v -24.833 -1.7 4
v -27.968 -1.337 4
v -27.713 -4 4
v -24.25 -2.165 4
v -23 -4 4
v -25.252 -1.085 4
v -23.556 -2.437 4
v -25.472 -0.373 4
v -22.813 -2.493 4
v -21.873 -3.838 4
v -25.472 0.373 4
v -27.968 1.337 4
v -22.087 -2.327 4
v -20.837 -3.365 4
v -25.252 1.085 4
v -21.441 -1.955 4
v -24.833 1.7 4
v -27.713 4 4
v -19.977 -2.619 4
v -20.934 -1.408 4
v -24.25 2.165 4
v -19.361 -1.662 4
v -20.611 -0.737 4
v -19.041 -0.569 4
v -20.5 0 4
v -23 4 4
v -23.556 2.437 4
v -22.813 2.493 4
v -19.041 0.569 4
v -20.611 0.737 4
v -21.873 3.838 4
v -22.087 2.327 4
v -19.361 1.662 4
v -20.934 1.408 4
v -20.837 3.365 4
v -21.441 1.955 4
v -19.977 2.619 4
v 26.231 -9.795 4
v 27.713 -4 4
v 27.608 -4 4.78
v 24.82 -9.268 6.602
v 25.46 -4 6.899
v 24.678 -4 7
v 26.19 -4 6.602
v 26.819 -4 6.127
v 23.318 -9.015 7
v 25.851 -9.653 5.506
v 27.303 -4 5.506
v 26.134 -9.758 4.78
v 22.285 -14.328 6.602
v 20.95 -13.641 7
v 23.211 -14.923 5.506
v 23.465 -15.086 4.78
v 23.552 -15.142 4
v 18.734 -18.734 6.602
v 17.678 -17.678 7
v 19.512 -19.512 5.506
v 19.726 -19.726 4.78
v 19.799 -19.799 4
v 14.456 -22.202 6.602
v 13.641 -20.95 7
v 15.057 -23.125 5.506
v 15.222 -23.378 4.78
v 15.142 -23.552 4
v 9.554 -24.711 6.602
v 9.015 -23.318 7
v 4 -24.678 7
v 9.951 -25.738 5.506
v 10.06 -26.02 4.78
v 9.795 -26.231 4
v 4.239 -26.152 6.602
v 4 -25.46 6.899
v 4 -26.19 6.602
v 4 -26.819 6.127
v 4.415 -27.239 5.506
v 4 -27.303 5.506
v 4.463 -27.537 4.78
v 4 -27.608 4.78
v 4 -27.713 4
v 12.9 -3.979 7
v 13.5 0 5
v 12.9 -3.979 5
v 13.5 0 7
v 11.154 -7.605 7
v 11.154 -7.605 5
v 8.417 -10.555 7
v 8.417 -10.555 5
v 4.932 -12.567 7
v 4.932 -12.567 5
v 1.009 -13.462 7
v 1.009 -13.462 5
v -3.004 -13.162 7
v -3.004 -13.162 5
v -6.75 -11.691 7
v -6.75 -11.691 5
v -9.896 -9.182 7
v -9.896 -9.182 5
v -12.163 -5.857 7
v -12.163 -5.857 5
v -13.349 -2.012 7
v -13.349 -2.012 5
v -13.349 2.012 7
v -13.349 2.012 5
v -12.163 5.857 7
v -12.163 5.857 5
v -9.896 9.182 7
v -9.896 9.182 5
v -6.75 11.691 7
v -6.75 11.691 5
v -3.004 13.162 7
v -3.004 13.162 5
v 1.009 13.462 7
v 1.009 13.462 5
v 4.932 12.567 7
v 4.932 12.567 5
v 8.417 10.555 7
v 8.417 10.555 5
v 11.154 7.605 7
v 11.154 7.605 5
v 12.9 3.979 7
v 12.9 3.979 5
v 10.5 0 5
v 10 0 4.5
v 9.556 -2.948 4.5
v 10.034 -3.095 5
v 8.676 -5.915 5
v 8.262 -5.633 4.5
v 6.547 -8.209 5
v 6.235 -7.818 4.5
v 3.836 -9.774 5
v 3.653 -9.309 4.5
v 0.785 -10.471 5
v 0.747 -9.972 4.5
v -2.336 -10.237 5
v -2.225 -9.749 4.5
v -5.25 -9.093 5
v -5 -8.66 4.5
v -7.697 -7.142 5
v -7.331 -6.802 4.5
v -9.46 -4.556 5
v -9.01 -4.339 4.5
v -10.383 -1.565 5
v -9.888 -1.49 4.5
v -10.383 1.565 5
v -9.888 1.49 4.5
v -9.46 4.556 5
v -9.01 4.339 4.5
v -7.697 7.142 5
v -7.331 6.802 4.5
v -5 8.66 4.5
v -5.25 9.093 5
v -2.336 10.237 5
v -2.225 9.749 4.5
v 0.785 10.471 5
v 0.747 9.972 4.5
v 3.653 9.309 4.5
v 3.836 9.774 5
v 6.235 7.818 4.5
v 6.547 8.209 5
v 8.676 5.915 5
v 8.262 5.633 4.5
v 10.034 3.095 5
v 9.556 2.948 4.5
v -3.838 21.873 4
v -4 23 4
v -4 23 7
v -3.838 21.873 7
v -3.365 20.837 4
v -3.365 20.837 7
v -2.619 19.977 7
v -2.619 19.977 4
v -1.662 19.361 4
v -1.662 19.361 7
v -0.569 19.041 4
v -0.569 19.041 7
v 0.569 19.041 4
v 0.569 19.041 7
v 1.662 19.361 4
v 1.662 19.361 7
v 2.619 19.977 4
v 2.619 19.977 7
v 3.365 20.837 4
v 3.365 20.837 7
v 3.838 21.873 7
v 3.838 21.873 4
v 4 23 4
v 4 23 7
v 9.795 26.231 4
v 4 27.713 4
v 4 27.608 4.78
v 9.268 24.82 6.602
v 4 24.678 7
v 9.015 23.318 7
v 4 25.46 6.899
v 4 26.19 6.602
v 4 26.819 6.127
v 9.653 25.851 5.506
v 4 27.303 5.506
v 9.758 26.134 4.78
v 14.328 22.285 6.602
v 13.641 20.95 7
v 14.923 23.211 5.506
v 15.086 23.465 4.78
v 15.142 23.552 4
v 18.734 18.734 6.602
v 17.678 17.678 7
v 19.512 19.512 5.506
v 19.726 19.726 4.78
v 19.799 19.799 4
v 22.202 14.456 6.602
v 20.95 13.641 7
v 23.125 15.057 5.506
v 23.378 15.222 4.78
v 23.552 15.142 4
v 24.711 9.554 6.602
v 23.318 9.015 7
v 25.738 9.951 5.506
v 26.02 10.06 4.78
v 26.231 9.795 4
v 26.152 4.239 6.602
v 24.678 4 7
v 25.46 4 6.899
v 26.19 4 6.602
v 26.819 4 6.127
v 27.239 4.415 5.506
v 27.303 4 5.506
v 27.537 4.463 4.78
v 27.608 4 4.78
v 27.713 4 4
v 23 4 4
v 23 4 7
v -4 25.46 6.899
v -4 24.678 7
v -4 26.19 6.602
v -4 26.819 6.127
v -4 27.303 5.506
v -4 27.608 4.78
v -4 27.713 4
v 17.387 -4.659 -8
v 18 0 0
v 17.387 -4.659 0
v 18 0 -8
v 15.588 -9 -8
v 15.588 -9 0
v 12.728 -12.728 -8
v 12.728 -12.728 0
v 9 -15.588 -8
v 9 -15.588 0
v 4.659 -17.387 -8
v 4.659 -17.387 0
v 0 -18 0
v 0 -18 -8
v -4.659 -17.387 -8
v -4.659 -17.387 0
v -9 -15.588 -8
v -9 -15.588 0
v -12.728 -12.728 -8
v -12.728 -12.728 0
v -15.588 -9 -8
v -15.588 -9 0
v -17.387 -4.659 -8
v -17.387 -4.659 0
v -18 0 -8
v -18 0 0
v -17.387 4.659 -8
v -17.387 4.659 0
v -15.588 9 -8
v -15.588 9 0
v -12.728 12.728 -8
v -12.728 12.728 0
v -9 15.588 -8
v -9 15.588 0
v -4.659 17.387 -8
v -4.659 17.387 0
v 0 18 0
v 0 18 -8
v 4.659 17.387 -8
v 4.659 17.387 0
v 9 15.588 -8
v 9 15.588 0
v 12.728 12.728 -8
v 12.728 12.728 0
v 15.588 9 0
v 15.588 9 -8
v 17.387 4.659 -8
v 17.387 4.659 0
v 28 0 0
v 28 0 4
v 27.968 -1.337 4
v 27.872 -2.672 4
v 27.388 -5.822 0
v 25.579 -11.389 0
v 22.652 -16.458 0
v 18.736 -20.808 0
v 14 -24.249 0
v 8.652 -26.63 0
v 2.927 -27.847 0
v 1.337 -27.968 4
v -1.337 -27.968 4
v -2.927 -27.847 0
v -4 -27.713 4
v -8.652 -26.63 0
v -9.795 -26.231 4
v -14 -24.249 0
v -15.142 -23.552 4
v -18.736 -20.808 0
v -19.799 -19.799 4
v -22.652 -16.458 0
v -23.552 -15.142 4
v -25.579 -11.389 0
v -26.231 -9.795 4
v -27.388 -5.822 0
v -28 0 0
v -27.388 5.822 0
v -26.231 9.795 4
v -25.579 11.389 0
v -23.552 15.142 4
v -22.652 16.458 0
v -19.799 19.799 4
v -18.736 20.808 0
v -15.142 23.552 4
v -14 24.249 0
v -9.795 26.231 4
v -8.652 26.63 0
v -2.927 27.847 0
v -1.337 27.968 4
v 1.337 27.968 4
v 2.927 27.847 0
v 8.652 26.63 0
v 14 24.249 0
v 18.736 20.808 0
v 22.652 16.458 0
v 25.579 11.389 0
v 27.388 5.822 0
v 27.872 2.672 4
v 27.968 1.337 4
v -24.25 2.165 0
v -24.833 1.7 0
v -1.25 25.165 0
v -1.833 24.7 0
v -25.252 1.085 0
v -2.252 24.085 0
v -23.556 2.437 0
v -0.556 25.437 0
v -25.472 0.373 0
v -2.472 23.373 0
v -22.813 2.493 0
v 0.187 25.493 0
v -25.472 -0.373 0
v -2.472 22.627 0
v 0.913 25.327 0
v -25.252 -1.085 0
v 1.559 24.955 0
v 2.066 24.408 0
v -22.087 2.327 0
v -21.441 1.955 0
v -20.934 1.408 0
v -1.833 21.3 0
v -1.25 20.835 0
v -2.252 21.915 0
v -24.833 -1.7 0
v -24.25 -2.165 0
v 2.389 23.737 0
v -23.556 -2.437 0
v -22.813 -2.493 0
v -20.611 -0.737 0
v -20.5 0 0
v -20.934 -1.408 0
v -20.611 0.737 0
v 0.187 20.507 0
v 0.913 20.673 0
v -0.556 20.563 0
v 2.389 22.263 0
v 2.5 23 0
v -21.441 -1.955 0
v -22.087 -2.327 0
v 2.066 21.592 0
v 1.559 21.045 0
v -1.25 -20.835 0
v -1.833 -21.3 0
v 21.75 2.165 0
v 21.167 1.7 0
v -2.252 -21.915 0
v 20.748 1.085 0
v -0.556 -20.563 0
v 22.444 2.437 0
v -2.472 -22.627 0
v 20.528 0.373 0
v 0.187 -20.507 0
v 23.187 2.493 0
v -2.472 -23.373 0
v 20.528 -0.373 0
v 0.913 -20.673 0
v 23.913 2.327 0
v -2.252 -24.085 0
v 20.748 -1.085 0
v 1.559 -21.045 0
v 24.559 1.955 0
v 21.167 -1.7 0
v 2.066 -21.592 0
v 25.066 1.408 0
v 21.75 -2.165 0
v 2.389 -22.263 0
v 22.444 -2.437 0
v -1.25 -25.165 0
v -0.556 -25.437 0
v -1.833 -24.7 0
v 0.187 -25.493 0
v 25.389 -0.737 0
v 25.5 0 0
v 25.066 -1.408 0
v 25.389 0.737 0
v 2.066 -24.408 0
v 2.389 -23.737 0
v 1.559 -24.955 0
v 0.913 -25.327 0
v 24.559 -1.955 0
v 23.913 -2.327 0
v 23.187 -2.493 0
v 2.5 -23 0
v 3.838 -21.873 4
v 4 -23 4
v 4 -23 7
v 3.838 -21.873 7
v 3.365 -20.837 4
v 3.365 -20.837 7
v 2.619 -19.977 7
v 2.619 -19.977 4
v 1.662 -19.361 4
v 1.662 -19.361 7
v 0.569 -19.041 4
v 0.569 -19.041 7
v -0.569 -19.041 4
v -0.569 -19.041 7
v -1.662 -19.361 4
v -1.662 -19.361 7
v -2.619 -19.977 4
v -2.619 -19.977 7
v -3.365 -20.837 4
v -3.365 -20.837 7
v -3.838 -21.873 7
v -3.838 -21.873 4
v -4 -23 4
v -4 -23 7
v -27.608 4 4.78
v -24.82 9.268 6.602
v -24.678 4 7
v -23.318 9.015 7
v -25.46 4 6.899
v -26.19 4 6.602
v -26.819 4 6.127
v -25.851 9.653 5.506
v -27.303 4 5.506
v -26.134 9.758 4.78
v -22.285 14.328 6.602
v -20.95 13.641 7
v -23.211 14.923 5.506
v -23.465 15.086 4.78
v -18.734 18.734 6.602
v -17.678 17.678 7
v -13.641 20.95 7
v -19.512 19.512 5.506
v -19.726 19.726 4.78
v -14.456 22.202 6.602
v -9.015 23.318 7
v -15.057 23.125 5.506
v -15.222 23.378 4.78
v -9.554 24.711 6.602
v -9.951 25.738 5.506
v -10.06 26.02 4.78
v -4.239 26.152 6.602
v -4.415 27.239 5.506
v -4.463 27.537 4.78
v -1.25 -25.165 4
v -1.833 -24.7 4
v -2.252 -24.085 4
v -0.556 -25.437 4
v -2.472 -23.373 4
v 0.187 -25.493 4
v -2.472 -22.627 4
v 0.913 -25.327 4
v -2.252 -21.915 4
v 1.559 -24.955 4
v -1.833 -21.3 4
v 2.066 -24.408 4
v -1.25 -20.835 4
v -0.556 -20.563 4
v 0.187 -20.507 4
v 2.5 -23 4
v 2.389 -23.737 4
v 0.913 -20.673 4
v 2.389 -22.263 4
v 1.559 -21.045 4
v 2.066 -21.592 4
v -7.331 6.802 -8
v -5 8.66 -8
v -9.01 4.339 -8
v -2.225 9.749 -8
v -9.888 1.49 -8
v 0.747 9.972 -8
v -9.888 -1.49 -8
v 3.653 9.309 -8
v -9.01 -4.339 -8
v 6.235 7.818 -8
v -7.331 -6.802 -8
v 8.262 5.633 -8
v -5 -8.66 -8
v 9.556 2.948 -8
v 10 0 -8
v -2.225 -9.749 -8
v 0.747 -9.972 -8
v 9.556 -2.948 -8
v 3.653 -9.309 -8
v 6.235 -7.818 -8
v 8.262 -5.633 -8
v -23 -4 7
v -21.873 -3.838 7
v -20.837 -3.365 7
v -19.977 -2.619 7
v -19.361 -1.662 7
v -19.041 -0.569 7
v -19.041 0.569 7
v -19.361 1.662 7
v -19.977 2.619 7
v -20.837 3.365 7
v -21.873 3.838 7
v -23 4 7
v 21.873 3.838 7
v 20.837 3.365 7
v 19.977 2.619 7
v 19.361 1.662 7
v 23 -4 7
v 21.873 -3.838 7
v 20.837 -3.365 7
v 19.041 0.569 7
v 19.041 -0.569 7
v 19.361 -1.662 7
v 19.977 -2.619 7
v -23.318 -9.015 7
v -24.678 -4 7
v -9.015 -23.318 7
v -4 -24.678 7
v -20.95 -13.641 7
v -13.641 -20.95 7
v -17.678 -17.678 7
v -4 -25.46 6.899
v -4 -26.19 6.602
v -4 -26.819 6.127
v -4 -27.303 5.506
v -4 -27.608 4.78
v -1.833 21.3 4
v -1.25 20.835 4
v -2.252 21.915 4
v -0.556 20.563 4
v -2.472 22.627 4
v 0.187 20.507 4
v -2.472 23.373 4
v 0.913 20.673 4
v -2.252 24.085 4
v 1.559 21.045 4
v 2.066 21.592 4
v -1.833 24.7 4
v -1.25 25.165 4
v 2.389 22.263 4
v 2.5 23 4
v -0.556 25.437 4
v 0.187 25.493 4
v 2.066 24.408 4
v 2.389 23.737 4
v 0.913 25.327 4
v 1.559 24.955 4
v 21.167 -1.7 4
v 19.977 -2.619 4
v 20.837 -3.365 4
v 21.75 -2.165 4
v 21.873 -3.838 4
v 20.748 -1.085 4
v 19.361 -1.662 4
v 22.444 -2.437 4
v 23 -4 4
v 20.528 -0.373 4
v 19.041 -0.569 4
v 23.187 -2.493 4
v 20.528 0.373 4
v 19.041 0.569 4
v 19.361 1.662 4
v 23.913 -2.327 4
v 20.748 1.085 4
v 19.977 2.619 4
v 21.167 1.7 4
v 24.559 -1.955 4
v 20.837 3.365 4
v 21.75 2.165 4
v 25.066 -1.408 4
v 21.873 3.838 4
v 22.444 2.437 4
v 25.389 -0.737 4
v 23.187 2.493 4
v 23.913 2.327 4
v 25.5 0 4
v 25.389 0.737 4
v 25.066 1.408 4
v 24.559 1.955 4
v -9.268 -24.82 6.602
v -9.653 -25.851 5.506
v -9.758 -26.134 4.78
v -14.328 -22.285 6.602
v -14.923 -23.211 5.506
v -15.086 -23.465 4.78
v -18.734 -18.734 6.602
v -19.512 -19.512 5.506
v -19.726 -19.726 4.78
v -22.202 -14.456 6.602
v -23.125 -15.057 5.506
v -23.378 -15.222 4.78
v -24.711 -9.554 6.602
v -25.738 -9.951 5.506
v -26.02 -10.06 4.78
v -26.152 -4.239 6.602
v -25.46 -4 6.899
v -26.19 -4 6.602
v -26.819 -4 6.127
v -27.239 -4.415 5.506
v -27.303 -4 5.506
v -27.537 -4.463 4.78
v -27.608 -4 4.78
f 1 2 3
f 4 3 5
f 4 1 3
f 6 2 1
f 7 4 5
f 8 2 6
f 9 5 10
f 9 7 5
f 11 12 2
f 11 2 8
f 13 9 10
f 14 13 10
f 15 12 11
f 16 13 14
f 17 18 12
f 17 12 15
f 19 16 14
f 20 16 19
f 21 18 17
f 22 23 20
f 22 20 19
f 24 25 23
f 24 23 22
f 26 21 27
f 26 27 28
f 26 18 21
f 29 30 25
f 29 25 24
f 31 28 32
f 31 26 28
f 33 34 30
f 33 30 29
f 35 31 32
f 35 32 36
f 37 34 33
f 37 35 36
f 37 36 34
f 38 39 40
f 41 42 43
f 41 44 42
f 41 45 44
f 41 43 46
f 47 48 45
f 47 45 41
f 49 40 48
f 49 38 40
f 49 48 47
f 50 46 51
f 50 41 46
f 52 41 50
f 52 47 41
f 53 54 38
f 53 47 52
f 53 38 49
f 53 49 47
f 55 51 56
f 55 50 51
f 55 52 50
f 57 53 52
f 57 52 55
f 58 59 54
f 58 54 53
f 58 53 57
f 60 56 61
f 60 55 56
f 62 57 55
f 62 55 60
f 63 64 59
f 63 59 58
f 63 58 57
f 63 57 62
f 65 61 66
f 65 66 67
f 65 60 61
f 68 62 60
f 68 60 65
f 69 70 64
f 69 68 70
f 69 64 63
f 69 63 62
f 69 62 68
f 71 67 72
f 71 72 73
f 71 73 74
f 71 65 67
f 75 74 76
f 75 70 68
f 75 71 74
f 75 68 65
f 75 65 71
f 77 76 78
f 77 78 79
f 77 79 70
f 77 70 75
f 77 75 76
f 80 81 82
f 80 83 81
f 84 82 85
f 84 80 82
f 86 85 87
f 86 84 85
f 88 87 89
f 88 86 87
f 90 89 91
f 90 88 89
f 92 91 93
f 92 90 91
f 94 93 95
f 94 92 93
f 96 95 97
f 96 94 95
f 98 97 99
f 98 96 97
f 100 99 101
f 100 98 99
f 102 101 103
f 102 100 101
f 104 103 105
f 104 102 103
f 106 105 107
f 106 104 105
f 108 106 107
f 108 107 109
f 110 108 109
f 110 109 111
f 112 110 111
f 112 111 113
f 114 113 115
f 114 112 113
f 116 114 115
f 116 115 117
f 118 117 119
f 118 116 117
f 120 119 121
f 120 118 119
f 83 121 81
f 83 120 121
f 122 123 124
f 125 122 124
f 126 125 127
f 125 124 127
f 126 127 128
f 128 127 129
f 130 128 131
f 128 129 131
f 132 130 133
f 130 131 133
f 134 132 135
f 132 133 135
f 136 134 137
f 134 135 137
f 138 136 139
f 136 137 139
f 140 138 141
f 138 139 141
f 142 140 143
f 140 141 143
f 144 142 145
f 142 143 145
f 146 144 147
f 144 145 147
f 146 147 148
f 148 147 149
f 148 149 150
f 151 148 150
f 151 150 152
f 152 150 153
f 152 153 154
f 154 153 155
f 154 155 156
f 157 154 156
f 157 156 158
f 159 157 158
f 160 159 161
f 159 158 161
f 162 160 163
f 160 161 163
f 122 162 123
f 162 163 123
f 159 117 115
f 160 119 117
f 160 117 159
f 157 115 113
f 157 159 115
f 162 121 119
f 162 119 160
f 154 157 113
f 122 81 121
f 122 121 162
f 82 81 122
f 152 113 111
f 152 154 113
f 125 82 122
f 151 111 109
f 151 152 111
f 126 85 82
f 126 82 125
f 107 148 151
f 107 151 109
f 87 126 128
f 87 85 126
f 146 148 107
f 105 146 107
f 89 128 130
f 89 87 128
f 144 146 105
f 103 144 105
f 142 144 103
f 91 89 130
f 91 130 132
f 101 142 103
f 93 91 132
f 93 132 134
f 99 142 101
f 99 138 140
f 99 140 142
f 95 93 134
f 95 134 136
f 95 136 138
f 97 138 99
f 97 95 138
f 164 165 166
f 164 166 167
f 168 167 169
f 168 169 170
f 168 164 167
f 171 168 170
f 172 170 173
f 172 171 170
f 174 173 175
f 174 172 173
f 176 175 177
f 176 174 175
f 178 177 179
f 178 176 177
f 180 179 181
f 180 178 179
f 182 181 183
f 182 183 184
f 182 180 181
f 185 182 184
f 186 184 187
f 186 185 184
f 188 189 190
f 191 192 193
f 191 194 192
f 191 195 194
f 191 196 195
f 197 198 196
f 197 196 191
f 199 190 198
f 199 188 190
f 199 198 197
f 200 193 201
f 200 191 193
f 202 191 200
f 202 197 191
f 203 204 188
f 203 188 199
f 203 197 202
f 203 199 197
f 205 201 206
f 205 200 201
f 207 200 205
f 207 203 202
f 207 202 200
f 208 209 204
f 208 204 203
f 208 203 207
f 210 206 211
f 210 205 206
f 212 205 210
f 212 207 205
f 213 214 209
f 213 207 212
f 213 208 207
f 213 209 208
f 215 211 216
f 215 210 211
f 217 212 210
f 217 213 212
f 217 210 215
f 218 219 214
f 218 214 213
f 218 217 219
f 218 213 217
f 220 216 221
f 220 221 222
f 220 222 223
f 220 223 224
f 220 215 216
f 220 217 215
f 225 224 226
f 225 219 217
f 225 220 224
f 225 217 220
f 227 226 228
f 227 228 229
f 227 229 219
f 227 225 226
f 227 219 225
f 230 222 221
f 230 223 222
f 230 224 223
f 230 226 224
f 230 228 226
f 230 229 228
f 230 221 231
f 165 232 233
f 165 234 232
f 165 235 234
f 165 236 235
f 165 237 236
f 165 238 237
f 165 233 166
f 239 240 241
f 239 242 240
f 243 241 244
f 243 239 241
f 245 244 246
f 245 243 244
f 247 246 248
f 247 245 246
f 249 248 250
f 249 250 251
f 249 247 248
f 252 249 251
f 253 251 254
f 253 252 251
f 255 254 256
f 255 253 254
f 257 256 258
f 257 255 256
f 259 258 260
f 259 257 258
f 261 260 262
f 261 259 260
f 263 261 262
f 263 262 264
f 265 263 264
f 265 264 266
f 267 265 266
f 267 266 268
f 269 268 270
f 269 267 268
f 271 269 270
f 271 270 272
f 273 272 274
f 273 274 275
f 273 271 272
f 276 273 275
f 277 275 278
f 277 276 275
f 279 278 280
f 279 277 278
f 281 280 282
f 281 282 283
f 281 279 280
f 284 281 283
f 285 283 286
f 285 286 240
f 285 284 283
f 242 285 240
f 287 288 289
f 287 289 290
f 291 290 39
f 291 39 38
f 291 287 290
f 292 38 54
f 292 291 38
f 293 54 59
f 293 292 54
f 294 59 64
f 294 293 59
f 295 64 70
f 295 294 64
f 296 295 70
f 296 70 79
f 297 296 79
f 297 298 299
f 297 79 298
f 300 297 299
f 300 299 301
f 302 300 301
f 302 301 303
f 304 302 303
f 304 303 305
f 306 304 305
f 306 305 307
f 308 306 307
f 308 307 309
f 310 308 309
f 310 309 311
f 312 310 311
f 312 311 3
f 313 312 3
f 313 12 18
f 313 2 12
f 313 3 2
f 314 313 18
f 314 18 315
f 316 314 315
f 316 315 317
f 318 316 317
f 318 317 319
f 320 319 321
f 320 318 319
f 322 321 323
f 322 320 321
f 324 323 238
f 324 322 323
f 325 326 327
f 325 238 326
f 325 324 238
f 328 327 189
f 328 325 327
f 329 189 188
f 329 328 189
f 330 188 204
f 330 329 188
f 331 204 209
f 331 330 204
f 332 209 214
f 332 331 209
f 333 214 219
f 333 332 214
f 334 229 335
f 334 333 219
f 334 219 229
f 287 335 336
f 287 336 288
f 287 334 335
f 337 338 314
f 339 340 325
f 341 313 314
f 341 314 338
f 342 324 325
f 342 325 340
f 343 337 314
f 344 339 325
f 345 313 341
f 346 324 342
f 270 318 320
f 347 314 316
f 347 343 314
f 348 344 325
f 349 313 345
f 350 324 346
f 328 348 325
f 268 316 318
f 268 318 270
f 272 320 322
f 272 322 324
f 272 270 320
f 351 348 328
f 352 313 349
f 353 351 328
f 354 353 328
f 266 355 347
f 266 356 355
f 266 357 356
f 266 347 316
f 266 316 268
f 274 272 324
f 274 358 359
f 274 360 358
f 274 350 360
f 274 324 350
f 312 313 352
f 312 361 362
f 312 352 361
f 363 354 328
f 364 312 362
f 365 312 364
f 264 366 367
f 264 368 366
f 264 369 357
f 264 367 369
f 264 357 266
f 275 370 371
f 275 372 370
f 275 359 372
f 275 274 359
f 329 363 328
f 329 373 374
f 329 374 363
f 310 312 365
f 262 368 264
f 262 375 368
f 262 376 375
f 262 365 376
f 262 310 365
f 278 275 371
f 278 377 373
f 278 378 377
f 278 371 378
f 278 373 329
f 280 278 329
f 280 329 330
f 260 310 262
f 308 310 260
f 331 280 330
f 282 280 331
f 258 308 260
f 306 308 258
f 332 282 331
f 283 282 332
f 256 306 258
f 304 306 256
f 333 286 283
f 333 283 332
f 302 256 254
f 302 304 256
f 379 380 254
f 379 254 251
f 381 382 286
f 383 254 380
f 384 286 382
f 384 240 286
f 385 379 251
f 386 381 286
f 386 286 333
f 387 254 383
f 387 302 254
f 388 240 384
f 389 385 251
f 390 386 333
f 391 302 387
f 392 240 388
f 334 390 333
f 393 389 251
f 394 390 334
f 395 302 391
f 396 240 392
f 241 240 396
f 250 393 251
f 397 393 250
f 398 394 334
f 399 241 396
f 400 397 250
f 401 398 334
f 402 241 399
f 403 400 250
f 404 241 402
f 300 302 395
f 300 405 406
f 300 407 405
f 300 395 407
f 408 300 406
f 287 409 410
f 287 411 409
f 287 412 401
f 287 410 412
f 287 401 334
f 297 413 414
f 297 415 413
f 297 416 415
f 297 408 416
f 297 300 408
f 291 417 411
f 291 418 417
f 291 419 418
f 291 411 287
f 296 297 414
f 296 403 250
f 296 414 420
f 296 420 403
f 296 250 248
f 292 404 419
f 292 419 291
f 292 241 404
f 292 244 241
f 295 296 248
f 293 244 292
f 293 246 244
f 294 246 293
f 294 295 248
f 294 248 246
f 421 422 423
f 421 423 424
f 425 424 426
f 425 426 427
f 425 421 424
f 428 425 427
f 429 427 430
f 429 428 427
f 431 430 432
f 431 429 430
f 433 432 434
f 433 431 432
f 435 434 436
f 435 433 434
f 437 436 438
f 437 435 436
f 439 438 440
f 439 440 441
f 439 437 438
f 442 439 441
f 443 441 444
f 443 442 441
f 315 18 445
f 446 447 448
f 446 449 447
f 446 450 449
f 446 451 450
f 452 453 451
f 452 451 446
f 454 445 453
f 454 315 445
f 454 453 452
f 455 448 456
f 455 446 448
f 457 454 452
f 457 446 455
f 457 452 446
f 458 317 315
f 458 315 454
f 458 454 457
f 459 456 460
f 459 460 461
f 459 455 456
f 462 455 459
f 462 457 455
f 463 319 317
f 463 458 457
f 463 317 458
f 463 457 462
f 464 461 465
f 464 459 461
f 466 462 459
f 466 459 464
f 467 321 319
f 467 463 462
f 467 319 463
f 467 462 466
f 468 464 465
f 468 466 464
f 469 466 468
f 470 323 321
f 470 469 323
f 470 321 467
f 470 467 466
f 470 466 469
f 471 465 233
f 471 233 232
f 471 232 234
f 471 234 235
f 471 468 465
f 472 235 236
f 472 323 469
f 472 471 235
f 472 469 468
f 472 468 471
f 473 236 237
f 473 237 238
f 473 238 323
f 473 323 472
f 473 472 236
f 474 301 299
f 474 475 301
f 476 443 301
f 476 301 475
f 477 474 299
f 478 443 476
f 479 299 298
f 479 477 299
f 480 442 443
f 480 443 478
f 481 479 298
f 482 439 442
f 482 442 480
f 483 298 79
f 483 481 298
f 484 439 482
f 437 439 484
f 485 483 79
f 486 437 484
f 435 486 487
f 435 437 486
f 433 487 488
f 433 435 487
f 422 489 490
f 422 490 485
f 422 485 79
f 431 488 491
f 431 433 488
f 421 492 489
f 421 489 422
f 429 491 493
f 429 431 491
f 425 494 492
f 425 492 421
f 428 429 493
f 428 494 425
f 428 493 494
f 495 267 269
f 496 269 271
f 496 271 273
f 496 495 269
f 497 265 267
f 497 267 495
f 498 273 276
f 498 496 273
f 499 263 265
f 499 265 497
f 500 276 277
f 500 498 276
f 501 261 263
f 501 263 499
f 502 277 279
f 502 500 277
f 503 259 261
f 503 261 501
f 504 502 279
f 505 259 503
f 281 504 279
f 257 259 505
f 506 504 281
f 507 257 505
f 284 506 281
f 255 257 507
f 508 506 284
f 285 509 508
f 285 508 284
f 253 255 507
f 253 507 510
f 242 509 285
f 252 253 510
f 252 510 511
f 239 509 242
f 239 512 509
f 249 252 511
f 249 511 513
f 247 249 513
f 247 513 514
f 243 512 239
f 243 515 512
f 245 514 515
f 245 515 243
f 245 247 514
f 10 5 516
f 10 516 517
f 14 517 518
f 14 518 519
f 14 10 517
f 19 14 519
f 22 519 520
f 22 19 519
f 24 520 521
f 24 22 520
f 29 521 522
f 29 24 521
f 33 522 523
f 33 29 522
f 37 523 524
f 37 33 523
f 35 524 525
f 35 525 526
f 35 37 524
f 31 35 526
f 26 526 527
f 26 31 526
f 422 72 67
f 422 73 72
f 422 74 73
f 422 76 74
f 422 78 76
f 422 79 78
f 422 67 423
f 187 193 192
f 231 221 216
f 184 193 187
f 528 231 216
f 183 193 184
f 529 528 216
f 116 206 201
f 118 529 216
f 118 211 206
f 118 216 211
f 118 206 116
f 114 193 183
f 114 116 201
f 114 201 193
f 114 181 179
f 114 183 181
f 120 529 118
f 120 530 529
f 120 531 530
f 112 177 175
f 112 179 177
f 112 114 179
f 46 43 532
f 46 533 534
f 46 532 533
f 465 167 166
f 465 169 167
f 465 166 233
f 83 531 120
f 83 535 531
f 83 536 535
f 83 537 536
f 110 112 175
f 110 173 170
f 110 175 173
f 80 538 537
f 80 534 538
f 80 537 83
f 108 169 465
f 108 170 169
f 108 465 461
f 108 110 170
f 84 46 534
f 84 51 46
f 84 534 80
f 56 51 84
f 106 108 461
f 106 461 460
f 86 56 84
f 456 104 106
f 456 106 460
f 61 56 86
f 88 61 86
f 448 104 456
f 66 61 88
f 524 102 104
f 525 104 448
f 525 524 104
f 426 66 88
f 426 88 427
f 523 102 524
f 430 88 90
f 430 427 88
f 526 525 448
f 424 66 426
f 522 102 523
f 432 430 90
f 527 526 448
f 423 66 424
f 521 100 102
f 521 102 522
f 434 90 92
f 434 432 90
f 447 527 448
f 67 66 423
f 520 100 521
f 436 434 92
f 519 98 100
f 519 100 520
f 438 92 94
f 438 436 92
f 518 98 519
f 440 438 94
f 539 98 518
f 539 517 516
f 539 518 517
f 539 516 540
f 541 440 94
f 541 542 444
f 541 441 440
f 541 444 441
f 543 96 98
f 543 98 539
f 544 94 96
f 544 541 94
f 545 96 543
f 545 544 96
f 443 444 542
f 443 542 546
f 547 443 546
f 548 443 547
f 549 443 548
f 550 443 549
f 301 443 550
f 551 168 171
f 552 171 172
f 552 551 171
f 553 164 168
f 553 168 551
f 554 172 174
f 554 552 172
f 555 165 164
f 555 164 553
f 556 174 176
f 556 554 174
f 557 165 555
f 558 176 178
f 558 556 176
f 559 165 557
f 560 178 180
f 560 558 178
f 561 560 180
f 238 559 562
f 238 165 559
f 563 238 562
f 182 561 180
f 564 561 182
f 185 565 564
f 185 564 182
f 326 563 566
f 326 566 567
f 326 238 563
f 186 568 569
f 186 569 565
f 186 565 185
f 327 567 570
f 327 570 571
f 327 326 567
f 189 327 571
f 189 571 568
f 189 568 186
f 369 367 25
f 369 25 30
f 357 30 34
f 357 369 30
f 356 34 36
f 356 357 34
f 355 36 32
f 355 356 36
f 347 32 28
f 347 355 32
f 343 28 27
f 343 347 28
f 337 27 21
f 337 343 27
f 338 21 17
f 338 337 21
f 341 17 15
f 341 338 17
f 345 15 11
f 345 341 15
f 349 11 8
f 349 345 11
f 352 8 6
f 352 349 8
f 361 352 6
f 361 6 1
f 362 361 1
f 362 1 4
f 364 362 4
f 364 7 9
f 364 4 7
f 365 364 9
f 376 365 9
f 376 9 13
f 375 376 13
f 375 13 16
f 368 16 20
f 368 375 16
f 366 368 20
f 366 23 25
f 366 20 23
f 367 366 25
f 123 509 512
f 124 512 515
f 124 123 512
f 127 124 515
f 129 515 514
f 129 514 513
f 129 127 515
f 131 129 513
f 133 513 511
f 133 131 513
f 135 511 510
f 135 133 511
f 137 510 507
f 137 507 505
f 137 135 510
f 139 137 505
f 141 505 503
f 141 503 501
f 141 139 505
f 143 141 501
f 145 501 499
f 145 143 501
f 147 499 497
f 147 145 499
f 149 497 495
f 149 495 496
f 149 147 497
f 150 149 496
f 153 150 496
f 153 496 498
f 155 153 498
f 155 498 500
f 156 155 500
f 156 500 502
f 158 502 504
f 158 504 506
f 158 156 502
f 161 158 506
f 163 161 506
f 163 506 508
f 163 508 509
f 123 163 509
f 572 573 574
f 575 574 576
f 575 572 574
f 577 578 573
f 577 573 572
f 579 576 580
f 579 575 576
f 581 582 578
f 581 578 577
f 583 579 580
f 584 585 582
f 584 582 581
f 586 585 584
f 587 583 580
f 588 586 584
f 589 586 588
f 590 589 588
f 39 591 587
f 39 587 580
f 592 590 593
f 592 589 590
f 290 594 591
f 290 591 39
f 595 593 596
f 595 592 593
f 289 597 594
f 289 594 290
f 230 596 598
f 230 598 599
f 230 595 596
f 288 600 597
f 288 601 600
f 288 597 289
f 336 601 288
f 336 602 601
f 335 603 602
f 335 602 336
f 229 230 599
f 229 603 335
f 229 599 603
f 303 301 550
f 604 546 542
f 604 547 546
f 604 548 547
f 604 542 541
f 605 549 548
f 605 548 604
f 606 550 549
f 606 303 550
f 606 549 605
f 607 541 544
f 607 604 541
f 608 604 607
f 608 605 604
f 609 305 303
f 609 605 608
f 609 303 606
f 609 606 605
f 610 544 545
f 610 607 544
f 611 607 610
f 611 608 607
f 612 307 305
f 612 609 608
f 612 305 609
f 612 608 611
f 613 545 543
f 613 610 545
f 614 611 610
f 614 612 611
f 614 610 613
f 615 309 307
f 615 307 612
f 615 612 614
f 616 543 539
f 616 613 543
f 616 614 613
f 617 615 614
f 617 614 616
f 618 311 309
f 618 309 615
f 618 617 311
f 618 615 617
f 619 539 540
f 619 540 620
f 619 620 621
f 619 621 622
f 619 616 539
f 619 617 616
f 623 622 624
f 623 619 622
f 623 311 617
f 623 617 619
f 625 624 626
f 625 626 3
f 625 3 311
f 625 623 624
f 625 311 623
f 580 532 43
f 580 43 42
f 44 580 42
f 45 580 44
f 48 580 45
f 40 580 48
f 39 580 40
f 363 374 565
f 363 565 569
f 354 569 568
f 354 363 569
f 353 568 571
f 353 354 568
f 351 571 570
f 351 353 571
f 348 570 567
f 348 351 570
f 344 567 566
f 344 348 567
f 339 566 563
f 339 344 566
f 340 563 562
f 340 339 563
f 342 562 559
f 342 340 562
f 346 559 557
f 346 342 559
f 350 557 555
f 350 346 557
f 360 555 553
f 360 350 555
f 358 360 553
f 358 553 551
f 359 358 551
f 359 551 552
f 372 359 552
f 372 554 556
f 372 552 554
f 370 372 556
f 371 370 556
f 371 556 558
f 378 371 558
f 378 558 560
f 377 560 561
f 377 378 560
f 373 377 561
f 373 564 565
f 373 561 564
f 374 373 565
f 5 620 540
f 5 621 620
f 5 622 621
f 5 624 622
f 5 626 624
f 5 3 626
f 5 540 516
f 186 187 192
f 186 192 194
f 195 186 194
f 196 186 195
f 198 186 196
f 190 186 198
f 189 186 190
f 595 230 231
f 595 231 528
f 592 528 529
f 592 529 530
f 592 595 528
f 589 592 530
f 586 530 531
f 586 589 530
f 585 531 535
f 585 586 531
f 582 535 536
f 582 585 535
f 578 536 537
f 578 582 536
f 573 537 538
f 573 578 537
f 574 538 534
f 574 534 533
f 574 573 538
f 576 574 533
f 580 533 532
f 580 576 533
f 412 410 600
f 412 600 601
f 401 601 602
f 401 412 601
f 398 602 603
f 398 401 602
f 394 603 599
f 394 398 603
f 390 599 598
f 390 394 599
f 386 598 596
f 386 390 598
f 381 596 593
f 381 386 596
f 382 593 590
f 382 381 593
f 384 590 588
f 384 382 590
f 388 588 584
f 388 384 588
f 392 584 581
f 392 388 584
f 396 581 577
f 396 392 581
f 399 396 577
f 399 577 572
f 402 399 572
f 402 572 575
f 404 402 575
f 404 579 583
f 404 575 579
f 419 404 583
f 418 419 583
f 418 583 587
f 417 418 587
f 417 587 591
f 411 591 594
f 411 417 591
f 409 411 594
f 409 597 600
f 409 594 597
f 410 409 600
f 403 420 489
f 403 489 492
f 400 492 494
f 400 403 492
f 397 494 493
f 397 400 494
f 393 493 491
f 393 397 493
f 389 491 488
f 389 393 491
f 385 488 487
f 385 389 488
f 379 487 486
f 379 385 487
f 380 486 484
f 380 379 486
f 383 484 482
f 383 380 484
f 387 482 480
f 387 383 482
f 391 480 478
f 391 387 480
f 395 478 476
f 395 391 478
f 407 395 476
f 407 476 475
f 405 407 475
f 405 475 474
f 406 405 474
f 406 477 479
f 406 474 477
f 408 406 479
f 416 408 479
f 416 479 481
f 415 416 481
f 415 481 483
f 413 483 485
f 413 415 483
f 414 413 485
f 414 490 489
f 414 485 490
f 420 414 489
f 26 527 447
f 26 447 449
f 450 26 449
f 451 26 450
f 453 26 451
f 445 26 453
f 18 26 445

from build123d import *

# Parameters (mm, degrees)
FILLET1_R               = 3
CHAMFER1_SIZE           = 0.5
CUT_EXTRUDE2_START      = -3
CUT_EXTRUDE2_DEPTH      = 3
CUT_EXTRUDE3_DEPTH      = 43.343830719
CUT_EXTRUDE3_DEPTH_BACK = 43.343830719
SKETCH3_4_R             = 2.5


with BuildPart() as part:
    # Sketch2 → Revolve1 (revolve)
    with BuildSketch(Plane(origin=(0, 0, 0), x_dir=(-1, 0, 0), z_dir=(0, 1, 0))):
        Polygon((13.5, 7), (28, 7), (28, 0), (18, 0), (18, -8), (10, -8), (10, 5), (13.5, 5), align=None)
    revolve(axis=Axis((0, 0, 28.029292285), (0, 0, -1)))

    # Fillet1
    fillet1_edges = [part.edges().sort_by_distance(p)[0] for p in [
        (28, 0, 7),
    ]]
    fillet(fillet1_edges, radius=FILLET1_R)

    # Chamfer1
    chamfer1_edges = [part.edges().sort_by_distance(p)[0] for p in [
        (10, 0, 5),
    ]]
    chamfer(chamfer1_edges, length=CHAMFER1_SIZE)

    # Sketch3 → Cut-Extrude2 (cut)
    with BuildSketch(Plane.XY.offset(7).offset(CUT_EXTRUDE2_START)):
        with BuildLine():
            ThreePointArc((-4, 23), (0, 19), (4, 23))
            Line((4, 23), (4, 27.712812921))
            ThreePointArc((4, 27.712812921), (0, 28), (-4, 27.712812921))
            Line((-4, 27.712812921), (-4, 23))
        make_face()
        with BuildLine():
            Line((-27.712812921, -4), (-23, -4))
            ThreePointArc((-23, -4), (-19, 0), (-23, 4))
            Line((-23, 4), (-27.712812921, 4))
            ThreePointArc((-27.712812921, 4), (-28, 0), (-27.712812921, -4))
        make_face()
        with BuildLine():
            Line((23, -4), (27.712812921, -4))
            ThreePointArc((27.712812921, -4), (28, 0), (27.712812921, 4))
            Line((27.712812921, 4), (23, 4))
            ThreePointArc((23, 4), (19, 0), (23, -4))
        make_face()
        with BuildLine():
            Line((4, -27.712812921), (4, -23))
            ThreePointArc((4, -23), (0, -19), (-4, -23))
            Line((-4, -23), (-4, -27.712812921))
            ThreePointArc((-4, -27.712812921), (0, -28), (4, -27.712812921))
        make_face()
    extrude(amount=CUT_EXTRUDE2_DEPTH, mode=Mode.SUBTRACT)

    # Sketch3<4> → Cut-Extrude3 (cut, two sides: drawn at the far end of the back side and taken through both)
    with BuildSketch(Plane.XY.offset(7).offset(-CUT_EXTRUDE3_DEPTH_BACK)):
        with Locations((0, 23)):
            Circle(SKETCH3_4_R)
        with Locations((-23, 0)):
            Circle(SKETCH3_4_R)
        with Locations((23, 0)):
            Circle(SKETCH3_4_R)
        with Locations((0, -23)):
            Circle(SKETCH3_4_R)
    extrude(amount=CUT_EXTRUDE3_DEPTH + CUT_EXTRUDE3_DEPTH_BACK, mode=Mode.SUBTRACT)


solid = part.part
